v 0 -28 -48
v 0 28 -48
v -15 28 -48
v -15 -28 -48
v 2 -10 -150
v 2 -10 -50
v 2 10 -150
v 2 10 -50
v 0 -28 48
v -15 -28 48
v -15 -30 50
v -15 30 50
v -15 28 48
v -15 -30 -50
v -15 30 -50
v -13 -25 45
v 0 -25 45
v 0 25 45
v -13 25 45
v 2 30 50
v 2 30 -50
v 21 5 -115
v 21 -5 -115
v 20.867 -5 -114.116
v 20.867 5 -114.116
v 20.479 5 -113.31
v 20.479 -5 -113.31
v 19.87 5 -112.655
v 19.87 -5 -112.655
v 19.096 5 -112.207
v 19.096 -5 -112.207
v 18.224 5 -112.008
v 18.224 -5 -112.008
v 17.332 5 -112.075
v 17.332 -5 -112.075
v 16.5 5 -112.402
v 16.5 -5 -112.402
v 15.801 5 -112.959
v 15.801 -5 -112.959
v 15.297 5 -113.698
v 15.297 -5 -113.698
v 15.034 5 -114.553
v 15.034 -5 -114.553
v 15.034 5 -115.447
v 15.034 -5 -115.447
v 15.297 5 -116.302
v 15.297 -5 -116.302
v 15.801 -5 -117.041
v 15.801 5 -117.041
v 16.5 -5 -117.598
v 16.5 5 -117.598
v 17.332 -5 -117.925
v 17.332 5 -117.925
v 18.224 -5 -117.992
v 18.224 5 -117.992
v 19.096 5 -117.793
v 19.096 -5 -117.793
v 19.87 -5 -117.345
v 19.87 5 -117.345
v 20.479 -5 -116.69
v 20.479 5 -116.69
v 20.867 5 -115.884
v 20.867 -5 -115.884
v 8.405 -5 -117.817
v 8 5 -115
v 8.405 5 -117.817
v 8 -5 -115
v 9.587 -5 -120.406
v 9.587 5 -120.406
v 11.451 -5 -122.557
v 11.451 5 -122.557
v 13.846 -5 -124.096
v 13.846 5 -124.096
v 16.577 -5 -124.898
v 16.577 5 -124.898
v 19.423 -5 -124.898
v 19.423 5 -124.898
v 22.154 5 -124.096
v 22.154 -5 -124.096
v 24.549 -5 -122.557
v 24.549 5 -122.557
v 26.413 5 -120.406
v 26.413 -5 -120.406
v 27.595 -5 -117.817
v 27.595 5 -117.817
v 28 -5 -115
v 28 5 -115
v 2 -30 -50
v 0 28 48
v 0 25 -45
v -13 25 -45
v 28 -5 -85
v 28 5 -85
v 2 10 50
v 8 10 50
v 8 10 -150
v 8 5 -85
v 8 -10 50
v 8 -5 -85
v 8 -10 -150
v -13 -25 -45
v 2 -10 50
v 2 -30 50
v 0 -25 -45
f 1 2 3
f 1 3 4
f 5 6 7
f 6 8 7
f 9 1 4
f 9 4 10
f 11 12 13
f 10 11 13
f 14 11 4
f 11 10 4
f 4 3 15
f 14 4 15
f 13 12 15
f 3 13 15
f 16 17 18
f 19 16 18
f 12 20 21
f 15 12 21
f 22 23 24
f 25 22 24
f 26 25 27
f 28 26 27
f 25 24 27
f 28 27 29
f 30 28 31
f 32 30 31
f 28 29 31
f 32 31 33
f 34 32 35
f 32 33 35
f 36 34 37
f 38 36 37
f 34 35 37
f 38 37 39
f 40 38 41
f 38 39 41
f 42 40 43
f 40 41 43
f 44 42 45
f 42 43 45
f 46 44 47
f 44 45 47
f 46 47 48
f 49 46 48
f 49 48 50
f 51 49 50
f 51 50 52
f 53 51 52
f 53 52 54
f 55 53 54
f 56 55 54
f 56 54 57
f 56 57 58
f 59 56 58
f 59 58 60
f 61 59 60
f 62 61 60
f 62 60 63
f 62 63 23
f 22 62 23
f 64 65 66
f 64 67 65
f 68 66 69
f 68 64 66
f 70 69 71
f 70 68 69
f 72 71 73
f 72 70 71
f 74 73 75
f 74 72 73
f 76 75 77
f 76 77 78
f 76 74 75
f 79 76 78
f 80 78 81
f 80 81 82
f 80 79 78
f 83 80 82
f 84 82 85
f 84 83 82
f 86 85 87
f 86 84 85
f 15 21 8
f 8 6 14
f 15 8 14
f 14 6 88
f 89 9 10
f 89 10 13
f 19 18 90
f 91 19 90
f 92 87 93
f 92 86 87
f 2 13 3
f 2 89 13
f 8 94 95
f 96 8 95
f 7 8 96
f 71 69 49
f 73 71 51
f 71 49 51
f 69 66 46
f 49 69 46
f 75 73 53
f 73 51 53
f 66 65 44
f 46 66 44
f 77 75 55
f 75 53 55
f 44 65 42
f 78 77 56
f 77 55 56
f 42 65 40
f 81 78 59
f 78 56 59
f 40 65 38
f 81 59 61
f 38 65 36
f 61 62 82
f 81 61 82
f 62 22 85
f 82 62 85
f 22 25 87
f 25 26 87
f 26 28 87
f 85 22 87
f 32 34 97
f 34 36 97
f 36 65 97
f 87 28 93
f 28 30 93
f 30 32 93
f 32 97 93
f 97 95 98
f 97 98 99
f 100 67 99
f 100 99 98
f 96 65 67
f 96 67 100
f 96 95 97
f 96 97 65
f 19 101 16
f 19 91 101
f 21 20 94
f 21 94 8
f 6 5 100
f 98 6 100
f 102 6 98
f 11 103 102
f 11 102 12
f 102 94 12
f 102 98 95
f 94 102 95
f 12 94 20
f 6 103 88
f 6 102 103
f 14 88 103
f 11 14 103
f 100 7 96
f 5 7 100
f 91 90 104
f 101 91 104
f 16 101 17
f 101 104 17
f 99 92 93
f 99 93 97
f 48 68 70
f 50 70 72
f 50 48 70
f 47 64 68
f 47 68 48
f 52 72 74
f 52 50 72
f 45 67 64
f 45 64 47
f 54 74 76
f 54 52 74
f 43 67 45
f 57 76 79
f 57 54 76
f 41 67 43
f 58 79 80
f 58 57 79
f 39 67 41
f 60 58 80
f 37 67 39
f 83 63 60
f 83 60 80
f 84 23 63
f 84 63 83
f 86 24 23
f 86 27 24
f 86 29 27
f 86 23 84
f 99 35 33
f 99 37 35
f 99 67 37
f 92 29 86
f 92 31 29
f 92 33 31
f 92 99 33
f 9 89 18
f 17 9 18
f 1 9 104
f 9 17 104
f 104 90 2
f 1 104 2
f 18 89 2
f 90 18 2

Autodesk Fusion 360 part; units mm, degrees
sketch "Sketch1" plane through (0, 0, 0) normal (1, 0, 0) x (0, 0, -1)
  line L0 (-50, 30) -> (50, 30)
  line L1 (50, 30) -> (50, -30)
  line L2 (50, -30) -> (-50, -30)
  line L3 (-50, -30) -> (-50, 30)
  line L4 (48, -28) -> (-48, -28)
  line L5 (-48, -28) -> (-48, 28)
  line L6 (-48, 28) -> (48, 28)
  line L7 (48, 28) -> (48, -28)
  dimension "d1" = 100
  dimension "d2" = 60
  dimension "d3" = 2
  dimension "d17" = 30
  dimension "d18" = 50
extrude "Extrude1" add sketch "Sketch1" along normal blind 2 contours L0 L1 L2 L3 | L4 L5 L6 L7
extrude "Extrude2" add sketch "Sketch1" against normal blind 15
sketch "Sketch2" plane through (0, 0, 0) normal (-1, 0, 0) x (0, 0, 1)
  line L0 (-48, 28) -> (-48, -28)
  line L1 (-48, -28) -> (48, -28)
  line L2 (48, -28) -> (48, 28)
  line L3 (48, 28) -> (-48, 28)
  line L4 (45, 25) -> (-45, 25)
  line L5 (-45, 25) -> (-45, -25)
  line L6 (-45, -25) -> (45, -25)
  line L7 (45, -25) -> (45, 25)
  line L8 (45, 25) -> (-45, -25) construction
  line L9 (-45, 25) -> (45, -25) construction
  dimension "d8" = 90
  dimension "d9" = 50
extrude "Extrude3" add sketch "Sketch2" along normal blind 13 contours L4 L5 L6 L7
sketch "Sketch4" plane through (2, 0, 0) normal (1, 0, 0) x (0, 0, -1)
  line L0 (-50, -30) -> (50, -30)
  line L1 (50, -30) -> (50, 30)
  line L2 (50, 30) -> (-50, 30)
  line L3 (-50, 30) -> (-50, -30)
  line L4 (-50, 10) -> (150, 10)
  line L5 (150, 10) -> (150, -10)
  line L6 (150, -10) -> (-50, -10)
  line L7 (-50, -10) -> (-50, 10)
extrude "Extrude4" add sketch "Sketch4" along normal blind 6 contours L1 L3 L4 L6 L7 | L1 L4 L5 L6
sketch "Sketch5" plane through (0, -10, 0) normal (0, -1, 0) x (1, 0, 0)
  line L0 (2, -50) -> (2, -150)
  line L1 (2, -150) -> (8, -150)
  line L2 (8, -150) -> (8, 50)
  line L3 (8, 50) -> (2, 50)
  line L4 (2, 50) -> (2, -50)
  line L5 (28, -115) -> (28, -85)
  line L6 (28, -85) -> (8, -85)
  arc A0 (8, -115) -> (28, -115) centre (18, -115) ccw
  circle A1 centre (18, -115) radius 3
  dimension "d28" = 6
extrude "Extrude5" add sketch "Sketch5" against normal blind 10 from surface at -5 contours L2 L5 L6 A0
